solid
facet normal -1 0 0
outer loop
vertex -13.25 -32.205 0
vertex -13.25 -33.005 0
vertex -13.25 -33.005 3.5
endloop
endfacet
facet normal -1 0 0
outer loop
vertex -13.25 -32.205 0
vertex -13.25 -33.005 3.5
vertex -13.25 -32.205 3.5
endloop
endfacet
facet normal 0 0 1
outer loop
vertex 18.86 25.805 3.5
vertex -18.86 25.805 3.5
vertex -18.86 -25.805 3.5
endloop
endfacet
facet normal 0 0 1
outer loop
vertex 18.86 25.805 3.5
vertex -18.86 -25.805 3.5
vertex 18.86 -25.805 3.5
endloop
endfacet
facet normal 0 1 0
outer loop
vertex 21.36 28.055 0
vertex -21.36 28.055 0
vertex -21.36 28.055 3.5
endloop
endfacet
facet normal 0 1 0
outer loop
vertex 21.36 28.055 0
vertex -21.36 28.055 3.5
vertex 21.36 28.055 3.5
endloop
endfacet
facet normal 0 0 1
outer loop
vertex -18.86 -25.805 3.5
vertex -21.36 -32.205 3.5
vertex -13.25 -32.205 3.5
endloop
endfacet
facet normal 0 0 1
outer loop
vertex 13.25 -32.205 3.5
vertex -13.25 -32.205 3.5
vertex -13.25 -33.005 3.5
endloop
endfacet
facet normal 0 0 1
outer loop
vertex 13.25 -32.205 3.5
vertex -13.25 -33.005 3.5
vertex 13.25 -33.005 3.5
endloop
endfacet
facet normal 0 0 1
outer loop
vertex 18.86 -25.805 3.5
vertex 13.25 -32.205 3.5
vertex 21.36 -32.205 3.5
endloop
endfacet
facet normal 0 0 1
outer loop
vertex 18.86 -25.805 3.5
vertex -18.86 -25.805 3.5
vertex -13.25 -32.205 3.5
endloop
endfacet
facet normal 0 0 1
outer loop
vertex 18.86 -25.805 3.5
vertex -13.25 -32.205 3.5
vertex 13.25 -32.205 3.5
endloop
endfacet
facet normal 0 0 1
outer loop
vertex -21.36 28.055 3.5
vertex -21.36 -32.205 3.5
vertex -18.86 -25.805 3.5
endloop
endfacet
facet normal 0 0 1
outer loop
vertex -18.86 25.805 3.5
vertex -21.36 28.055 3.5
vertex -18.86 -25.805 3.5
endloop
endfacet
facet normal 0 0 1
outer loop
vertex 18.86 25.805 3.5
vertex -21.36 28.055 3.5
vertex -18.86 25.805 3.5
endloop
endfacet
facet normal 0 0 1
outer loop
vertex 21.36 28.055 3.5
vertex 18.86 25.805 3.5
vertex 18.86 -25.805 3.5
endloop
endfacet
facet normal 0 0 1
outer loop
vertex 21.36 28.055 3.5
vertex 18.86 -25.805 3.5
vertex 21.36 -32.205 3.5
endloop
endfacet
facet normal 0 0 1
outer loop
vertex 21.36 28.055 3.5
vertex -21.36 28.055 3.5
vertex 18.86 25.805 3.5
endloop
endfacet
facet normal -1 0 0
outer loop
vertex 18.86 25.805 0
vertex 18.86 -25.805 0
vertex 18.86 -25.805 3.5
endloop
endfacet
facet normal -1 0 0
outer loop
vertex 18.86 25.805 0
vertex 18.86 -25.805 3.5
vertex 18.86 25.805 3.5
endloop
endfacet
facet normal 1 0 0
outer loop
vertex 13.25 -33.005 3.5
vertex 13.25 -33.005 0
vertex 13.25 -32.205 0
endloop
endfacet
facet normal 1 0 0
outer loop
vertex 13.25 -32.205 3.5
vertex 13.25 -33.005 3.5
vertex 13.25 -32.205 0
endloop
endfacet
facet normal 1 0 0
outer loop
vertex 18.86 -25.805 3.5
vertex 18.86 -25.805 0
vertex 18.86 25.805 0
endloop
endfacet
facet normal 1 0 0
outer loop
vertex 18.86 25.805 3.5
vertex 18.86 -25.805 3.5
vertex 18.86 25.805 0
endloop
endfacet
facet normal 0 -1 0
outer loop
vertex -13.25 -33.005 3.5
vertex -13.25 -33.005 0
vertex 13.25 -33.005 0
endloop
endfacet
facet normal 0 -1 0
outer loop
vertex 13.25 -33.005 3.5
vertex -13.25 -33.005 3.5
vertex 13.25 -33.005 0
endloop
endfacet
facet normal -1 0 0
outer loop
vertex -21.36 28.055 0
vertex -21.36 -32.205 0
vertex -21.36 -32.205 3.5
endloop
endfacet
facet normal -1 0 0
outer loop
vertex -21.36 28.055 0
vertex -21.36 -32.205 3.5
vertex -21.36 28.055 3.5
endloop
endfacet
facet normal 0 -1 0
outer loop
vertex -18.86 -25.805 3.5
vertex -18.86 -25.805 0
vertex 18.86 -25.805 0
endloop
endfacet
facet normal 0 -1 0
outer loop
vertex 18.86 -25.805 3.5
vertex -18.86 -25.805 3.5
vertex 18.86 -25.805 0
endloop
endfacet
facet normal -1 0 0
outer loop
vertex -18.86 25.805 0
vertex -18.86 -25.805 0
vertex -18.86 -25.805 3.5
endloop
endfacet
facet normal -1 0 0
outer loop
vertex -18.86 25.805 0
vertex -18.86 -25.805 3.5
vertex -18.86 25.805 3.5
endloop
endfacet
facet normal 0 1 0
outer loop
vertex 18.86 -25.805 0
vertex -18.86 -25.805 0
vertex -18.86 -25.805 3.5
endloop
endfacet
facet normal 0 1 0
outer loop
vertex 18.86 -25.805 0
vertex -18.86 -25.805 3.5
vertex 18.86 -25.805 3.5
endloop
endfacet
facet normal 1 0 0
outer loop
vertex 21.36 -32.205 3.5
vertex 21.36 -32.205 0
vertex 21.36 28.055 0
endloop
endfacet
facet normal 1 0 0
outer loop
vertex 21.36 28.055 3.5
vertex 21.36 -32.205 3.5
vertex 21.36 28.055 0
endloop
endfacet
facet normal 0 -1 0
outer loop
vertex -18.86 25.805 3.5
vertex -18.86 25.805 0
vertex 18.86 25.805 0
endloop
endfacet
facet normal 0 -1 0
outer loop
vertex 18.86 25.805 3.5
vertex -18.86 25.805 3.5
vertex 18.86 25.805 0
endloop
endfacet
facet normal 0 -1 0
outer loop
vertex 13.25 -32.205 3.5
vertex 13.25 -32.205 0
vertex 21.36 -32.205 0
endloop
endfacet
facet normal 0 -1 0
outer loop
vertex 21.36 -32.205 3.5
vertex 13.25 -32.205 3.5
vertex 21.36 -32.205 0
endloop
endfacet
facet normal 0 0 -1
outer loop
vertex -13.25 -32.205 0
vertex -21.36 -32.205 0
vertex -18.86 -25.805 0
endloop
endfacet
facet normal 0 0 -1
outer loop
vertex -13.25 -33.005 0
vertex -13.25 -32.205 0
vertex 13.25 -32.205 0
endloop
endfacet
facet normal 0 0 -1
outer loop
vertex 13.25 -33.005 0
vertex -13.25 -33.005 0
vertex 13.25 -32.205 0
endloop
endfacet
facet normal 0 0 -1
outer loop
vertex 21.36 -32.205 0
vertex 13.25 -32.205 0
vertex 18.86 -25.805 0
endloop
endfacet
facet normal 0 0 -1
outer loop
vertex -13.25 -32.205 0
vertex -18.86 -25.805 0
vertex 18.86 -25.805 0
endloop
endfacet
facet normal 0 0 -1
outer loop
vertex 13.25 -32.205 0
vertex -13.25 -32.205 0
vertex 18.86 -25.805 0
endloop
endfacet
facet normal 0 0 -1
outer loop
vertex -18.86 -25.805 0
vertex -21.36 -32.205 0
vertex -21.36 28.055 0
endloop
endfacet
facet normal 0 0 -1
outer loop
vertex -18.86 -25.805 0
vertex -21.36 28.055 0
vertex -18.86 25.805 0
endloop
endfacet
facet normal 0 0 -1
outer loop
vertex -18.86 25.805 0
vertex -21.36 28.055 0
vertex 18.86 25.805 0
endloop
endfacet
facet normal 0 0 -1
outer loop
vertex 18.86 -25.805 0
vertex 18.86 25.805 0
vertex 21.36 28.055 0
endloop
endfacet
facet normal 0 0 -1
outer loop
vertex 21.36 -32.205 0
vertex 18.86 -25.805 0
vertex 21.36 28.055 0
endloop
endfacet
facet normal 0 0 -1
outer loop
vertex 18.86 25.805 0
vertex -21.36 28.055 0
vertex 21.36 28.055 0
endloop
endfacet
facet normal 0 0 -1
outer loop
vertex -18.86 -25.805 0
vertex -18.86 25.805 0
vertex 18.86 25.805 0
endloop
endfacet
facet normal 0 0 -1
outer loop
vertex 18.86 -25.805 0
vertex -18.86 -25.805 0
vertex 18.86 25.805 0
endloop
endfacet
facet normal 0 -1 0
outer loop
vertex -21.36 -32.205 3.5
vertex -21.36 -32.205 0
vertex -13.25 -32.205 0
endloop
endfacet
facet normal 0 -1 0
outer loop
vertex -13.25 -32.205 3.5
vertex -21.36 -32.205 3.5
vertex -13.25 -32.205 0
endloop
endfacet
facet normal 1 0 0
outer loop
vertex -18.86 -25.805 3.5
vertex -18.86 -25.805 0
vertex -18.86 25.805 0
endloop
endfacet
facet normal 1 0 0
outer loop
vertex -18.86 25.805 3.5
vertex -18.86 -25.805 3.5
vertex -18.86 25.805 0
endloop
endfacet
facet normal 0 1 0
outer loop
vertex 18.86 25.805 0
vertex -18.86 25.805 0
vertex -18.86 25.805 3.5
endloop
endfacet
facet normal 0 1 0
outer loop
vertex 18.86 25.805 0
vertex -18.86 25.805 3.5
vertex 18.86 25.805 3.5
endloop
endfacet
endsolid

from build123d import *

# Parameters (mm, degrees)
SKETCH1_W           = 42.72
SKETCH1_H           = 60.26
SKETCH1_W_2         = 37.72
SKETCH1_H_2         = 51.61
SKETCH1_W_3         = 26.5
SKETCH1_H_3         = 0.8
BOSS_EXTRUDE1_DEPTH = 3.5
SKETCH1_3_W         = 37.72
SKETCH1_3_H         = 51.61
BOSS_EXTRUDE2_DEPTH = 3.5


with BuildPart() as part:
    # Sketch1 → Boss-Extrude1 (new body)
    with BuildSketch(Plane.XY):
        with Locations((0, -2.075)):
            Rectangle(SKETCH1_W, SKETCH1_H)
        Rectangle(SKETCH1_W_2, SKETCH1_H_2, mode=Mode.SUBTRACT)
        with Locations((0, -32.605)):
            Rectangle(SKETCH1_W_3, SKETCH1_H_3)
    extrude(amount=BOSS_EXTRUDE1_DEPTH)


with BuildPart() as body_2:
    # Sketch1<3> → Boss-Extrude2 (new body)
    with BuildSketch(Plane.XY):
        Rectangle(SKETCH1_3_W, SKETCH1_3_H)
    extrude(amount=BOSS_EXTRUDE2_DEPTH)


solid = Compound([part.part, body_2.part])
